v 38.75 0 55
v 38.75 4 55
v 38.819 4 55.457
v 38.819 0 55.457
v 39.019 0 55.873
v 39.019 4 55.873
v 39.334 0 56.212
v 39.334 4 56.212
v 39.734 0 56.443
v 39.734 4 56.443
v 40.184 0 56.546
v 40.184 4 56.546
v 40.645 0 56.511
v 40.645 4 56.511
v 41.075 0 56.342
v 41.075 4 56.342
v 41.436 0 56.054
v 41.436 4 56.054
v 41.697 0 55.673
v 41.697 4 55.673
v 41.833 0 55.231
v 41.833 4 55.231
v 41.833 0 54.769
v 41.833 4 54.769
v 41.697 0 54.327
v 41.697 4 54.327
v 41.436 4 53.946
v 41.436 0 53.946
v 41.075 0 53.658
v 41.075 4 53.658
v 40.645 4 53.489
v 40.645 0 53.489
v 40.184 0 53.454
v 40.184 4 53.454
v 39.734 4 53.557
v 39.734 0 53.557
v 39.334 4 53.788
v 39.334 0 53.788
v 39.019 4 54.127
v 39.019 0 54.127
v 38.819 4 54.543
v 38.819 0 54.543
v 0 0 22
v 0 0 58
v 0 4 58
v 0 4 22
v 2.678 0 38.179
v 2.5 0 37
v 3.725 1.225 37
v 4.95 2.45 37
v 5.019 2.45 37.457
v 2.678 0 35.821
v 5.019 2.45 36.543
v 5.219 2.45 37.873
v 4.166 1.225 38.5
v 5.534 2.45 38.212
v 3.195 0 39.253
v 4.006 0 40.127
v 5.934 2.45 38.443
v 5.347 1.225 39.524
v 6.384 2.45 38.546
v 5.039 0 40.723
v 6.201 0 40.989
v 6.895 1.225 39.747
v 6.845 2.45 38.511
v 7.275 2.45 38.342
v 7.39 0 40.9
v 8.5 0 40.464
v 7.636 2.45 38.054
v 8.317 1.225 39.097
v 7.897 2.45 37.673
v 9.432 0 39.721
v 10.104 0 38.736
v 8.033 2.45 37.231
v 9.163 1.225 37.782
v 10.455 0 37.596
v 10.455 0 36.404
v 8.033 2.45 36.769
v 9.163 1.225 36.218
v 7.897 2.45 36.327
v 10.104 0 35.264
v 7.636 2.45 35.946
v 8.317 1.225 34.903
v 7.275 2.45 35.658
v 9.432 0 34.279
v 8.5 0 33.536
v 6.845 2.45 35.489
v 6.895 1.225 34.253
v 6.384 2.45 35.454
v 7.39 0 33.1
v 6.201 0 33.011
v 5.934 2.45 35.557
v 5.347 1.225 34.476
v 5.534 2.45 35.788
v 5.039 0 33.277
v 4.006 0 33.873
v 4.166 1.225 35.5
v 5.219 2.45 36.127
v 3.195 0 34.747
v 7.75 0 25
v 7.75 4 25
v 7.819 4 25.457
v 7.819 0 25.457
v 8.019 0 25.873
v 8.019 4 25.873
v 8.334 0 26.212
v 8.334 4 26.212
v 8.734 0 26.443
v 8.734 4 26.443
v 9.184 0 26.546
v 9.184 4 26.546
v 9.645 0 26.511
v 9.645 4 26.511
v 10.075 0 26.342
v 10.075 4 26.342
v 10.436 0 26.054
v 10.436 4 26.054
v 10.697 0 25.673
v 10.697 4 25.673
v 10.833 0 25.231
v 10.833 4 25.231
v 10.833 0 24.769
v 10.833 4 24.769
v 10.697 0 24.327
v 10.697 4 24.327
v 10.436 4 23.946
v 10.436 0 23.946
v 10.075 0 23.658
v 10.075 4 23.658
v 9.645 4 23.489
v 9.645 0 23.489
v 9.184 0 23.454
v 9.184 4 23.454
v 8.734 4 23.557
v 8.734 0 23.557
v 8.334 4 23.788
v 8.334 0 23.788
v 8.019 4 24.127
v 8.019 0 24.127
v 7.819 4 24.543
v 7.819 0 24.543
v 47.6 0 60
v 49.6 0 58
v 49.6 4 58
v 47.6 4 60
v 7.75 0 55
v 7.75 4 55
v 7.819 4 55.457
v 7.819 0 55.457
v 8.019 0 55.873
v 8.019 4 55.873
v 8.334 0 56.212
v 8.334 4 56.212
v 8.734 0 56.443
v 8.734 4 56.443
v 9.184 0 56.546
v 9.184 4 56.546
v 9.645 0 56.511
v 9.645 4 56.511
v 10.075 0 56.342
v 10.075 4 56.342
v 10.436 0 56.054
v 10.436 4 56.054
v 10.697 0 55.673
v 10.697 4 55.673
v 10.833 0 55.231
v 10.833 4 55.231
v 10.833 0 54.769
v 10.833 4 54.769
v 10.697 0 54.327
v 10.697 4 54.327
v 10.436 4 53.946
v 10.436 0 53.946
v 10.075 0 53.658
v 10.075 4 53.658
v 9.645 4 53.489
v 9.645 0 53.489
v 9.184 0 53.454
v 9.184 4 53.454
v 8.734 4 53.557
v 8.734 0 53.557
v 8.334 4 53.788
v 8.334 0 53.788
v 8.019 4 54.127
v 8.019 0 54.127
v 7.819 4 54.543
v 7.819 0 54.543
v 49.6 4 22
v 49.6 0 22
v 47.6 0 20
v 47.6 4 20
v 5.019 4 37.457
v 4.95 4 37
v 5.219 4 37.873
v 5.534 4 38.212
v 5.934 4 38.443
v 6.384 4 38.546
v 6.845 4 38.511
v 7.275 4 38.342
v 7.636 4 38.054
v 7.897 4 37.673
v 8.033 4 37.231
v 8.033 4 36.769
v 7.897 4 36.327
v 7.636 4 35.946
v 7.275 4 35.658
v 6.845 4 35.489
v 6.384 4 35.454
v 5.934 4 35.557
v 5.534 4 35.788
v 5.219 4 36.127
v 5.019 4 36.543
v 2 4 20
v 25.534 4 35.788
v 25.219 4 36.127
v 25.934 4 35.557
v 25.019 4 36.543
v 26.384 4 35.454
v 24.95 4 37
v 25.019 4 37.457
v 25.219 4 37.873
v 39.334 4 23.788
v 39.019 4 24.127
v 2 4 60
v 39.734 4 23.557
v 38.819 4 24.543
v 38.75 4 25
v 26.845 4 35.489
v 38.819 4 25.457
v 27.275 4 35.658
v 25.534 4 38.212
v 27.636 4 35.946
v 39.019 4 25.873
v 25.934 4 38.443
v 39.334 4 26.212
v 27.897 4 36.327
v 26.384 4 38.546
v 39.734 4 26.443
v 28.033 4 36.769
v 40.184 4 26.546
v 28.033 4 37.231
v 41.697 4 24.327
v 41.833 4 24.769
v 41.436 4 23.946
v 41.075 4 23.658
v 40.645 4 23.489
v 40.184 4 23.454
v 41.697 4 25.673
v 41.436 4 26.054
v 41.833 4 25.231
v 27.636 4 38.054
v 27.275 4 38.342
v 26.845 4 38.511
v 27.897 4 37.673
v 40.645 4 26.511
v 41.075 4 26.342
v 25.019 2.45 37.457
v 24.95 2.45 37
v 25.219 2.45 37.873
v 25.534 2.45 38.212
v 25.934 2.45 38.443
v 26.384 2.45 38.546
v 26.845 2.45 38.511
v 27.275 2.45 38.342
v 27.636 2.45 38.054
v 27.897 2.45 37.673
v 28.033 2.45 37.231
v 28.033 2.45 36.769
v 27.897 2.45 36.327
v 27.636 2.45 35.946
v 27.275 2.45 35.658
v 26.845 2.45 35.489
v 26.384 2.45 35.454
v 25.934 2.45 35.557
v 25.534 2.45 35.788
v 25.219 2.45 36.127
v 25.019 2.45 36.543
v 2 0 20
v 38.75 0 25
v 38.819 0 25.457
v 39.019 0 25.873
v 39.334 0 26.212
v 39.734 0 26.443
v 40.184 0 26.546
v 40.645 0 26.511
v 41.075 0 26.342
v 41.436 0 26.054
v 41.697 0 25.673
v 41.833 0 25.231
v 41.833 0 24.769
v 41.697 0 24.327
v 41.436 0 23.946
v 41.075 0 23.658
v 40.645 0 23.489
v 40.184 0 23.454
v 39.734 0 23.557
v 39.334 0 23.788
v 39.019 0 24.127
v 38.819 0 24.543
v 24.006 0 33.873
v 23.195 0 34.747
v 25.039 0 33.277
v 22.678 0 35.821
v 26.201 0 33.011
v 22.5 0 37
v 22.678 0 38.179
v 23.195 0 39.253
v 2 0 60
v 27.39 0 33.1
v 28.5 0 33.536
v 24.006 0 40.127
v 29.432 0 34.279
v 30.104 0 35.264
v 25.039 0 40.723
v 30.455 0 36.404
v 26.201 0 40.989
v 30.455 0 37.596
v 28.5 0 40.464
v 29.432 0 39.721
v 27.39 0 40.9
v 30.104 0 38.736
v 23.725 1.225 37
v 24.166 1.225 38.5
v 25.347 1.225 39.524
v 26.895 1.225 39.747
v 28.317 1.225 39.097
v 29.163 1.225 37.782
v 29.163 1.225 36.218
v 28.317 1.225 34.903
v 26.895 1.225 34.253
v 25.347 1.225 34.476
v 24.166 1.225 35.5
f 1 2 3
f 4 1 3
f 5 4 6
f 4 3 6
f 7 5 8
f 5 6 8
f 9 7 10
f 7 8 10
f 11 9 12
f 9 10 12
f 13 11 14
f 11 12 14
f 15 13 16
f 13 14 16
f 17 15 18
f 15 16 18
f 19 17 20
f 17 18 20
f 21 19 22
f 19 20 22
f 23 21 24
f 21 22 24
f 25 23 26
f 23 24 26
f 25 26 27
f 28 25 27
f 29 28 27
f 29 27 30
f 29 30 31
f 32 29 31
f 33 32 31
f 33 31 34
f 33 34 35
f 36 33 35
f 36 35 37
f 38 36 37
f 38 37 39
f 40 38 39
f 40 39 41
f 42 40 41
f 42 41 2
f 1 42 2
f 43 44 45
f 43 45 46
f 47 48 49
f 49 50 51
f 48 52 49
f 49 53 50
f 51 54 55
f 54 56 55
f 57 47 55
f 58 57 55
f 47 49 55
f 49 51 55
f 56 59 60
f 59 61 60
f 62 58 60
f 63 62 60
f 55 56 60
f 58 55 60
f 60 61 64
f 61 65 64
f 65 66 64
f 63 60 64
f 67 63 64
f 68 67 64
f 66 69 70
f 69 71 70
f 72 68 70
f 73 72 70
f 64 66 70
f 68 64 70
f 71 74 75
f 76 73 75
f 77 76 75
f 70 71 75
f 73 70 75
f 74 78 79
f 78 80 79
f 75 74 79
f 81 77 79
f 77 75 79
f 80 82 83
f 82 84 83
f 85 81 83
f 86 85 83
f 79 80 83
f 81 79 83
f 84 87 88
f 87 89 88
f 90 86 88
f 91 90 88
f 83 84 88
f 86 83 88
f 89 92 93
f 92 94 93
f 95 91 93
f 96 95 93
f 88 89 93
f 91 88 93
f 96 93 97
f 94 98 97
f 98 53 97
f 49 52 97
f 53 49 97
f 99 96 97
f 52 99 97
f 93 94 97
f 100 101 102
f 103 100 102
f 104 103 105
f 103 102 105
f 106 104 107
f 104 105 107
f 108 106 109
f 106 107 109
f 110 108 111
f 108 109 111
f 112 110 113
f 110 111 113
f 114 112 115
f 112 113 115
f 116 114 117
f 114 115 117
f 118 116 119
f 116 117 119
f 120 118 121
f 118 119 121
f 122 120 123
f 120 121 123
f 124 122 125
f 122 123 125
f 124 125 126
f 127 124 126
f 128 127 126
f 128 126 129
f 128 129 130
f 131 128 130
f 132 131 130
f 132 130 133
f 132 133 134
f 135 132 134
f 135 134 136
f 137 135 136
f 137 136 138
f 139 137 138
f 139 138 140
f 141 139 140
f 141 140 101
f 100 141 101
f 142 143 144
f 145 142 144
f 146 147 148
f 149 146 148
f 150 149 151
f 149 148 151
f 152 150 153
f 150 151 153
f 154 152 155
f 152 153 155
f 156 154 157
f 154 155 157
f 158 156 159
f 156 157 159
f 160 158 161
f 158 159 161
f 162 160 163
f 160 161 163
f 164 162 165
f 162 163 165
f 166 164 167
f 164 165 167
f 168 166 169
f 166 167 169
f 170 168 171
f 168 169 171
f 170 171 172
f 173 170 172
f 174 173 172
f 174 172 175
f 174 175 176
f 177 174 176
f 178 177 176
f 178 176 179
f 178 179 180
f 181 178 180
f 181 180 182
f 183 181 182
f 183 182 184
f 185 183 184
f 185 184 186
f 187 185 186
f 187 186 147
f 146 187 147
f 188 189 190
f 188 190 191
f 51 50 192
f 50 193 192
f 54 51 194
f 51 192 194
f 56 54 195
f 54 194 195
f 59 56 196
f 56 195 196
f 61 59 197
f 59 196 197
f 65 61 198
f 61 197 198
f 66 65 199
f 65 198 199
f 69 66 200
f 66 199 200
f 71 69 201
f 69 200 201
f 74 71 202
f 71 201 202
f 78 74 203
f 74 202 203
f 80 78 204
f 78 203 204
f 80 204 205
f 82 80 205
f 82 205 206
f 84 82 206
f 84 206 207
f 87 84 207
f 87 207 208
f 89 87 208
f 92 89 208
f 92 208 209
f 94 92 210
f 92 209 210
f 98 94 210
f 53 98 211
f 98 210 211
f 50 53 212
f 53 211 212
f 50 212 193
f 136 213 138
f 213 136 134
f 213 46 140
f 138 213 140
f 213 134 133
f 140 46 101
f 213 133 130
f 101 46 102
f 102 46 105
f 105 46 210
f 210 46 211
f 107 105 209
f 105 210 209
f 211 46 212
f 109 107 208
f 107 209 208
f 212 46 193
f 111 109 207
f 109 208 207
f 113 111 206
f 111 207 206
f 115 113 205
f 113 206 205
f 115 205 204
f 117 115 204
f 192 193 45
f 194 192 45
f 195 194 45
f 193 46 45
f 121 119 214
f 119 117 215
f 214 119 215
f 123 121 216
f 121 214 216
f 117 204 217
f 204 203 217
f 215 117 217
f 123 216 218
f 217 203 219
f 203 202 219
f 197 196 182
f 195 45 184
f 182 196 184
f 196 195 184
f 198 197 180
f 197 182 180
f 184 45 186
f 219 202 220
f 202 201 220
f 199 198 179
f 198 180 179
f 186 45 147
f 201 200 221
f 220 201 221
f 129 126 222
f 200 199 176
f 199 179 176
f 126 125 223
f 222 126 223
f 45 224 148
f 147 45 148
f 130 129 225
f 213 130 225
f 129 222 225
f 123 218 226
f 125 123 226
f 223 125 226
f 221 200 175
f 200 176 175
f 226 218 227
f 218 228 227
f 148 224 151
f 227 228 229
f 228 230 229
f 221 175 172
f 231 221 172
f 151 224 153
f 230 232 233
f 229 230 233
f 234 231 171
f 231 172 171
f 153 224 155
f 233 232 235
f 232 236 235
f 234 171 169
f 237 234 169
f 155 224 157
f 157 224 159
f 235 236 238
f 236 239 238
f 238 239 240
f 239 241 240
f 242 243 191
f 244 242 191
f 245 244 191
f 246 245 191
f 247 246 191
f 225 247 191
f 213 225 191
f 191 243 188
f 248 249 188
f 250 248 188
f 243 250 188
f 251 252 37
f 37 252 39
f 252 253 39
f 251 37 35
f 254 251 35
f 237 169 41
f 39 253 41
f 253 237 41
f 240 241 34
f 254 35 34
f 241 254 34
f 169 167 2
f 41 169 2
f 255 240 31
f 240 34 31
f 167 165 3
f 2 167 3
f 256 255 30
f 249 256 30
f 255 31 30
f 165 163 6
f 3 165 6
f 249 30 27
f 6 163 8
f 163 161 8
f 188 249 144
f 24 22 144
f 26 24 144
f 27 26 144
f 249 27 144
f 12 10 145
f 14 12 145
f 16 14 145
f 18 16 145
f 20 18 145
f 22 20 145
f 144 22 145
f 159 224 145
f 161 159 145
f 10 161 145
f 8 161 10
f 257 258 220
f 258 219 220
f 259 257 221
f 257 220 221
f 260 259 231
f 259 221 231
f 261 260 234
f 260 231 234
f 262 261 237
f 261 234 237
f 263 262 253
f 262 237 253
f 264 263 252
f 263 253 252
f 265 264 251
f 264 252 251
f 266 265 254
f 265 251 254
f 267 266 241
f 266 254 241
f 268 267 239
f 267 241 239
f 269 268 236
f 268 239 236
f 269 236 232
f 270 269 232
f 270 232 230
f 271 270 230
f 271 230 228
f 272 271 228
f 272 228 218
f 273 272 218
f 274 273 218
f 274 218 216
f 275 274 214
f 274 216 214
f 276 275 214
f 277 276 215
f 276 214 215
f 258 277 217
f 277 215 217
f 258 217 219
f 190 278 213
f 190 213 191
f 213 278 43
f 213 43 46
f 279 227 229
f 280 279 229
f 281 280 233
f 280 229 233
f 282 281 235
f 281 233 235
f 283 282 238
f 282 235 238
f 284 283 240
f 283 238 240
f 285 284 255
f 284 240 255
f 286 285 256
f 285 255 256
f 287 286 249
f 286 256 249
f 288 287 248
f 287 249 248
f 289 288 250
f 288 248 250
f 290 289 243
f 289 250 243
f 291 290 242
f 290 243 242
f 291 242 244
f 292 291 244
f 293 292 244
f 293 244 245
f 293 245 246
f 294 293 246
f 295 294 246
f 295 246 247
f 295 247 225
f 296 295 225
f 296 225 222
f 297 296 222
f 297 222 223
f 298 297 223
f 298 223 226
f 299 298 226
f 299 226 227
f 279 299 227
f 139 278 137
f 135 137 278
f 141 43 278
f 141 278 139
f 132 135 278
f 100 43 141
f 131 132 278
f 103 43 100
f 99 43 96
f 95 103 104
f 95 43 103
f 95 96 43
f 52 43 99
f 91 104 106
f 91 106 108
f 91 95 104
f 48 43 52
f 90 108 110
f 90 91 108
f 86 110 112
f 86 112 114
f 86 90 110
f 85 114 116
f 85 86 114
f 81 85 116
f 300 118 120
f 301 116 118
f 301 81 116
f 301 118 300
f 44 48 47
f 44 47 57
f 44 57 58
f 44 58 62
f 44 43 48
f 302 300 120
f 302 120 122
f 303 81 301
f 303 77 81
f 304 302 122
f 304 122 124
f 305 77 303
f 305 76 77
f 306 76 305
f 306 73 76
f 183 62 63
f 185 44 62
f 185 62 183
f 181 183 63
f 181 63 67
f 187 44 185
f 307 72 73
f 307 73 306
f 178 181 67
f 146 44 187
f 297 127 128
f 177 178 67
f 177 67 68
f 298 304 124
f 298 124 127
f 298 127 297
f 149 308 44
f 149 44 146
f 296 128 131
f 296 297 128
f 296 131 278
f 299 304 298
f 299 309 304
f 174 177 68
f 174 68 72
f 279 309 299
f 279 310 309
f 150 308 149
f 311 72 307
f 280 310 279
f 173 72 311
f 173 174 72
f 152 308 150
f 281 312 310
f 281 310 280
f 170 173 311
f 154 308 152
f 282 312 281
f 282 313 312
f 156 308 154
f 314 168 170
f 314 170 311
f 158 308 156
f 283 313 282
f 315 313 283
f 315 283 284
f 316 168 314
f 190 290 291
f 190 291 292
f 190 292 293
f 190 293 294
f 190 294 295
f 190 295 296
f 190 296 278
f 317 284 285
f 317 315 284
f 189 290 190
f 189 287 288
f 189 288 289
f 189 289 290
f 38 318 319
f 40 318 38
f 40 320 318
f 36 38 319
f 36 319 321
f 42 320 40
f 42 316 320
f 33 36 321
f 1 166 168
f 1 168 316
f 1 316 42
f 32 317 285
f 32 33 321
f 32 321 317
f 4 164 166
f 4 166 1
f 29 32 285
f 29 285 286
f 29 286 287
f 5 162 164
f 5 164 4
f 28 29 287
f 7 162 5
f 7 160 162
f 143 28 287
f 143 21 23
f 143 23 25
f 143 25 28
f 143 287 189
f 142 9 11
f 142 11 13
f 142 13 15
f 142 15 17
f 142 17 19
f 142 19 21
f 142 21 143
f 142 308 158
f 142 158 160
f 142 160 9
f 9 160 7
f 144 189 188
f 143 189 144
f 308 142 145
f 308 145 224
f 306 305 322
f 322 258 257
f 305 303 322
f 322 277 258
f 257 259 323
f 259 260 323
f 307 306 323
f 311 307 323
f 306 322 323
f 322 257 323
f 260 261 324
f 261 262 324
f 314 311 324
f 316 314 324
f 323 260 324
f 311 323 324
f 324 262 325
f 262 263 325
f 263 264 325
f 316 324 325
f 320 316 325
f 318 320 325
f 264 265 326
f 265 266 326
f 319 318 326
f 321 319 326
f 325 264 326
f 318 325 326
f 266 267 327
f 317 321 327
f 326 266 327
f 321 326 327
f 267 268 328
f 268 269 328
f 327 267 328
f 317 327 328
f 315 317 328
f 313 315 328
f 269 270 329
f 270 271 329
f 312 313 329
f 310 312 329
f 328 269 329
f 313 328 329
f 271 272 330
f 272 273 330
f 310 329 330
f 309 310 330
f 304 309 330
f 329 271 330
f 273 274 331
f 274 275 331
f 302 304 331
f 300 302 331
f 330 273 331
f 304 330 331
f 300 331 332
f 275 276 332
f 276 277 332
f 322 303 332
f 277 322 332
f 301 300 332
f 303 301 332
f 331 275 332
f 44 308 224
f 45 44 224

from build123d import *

# Parameters (mm, degrees)
F1_DEPTH       = 4
F2_D           = 3.1
F3_D           = 3.1
F3_CSINK_D     = 8
F3_CSINK_ANGLE = 90
F4_W           = 49.6
F4_H           = 20
F5_DEPTH       = 4
F6_SIZE        = 2


with BuildPart() as f1:
    # F0 (on Front) → F1 (new body)
    with BuildSketch(Plane.XZ):
        Polygon((0, 24.9760837853), (0, 0), (49.6, 0), (49.6, 60), (0, 60), (0, 34.9760837853), align=None)
    extrude(amount=-F1_DEPTH)

    # F2 (through all)
    with Locations(Plane.XZ):
        with Locations((9.3, 55), (40.3, 55), (9.3, 25), (40.3, 25)):
            Hole(F2_D / 2)

    # F3 (through all)
    with Locations(Plane.XZ):
        with Locations((6.5, 37), (26.5, 37)):
            CounterSinkHole(F3_D / 2, F3_CSINK_D / 2, counter_sink_angle=F3_CSINK_ANGLE)

    # F4 (on face) → F5 (cut, through all)
    with BuildSketch(Plane.XZ):
        with Locations((24.8, 10)):
            Rectangle(F4_W, F4_H)
    extrude(amount=-F5_DEPTH, mode=Mode.SUBTRACT)

    # F6
    f6_edges = [f1.edges().sort_by_distance(p)[0] for p in [
        (49.6, 2, 60),
        (49.6, 2, 20),
        (0, 2, 60),
        (0, 2, 20),
    ]]
    chamfer(f6_edges, length=F6_SIZE)


solid = f1.part
